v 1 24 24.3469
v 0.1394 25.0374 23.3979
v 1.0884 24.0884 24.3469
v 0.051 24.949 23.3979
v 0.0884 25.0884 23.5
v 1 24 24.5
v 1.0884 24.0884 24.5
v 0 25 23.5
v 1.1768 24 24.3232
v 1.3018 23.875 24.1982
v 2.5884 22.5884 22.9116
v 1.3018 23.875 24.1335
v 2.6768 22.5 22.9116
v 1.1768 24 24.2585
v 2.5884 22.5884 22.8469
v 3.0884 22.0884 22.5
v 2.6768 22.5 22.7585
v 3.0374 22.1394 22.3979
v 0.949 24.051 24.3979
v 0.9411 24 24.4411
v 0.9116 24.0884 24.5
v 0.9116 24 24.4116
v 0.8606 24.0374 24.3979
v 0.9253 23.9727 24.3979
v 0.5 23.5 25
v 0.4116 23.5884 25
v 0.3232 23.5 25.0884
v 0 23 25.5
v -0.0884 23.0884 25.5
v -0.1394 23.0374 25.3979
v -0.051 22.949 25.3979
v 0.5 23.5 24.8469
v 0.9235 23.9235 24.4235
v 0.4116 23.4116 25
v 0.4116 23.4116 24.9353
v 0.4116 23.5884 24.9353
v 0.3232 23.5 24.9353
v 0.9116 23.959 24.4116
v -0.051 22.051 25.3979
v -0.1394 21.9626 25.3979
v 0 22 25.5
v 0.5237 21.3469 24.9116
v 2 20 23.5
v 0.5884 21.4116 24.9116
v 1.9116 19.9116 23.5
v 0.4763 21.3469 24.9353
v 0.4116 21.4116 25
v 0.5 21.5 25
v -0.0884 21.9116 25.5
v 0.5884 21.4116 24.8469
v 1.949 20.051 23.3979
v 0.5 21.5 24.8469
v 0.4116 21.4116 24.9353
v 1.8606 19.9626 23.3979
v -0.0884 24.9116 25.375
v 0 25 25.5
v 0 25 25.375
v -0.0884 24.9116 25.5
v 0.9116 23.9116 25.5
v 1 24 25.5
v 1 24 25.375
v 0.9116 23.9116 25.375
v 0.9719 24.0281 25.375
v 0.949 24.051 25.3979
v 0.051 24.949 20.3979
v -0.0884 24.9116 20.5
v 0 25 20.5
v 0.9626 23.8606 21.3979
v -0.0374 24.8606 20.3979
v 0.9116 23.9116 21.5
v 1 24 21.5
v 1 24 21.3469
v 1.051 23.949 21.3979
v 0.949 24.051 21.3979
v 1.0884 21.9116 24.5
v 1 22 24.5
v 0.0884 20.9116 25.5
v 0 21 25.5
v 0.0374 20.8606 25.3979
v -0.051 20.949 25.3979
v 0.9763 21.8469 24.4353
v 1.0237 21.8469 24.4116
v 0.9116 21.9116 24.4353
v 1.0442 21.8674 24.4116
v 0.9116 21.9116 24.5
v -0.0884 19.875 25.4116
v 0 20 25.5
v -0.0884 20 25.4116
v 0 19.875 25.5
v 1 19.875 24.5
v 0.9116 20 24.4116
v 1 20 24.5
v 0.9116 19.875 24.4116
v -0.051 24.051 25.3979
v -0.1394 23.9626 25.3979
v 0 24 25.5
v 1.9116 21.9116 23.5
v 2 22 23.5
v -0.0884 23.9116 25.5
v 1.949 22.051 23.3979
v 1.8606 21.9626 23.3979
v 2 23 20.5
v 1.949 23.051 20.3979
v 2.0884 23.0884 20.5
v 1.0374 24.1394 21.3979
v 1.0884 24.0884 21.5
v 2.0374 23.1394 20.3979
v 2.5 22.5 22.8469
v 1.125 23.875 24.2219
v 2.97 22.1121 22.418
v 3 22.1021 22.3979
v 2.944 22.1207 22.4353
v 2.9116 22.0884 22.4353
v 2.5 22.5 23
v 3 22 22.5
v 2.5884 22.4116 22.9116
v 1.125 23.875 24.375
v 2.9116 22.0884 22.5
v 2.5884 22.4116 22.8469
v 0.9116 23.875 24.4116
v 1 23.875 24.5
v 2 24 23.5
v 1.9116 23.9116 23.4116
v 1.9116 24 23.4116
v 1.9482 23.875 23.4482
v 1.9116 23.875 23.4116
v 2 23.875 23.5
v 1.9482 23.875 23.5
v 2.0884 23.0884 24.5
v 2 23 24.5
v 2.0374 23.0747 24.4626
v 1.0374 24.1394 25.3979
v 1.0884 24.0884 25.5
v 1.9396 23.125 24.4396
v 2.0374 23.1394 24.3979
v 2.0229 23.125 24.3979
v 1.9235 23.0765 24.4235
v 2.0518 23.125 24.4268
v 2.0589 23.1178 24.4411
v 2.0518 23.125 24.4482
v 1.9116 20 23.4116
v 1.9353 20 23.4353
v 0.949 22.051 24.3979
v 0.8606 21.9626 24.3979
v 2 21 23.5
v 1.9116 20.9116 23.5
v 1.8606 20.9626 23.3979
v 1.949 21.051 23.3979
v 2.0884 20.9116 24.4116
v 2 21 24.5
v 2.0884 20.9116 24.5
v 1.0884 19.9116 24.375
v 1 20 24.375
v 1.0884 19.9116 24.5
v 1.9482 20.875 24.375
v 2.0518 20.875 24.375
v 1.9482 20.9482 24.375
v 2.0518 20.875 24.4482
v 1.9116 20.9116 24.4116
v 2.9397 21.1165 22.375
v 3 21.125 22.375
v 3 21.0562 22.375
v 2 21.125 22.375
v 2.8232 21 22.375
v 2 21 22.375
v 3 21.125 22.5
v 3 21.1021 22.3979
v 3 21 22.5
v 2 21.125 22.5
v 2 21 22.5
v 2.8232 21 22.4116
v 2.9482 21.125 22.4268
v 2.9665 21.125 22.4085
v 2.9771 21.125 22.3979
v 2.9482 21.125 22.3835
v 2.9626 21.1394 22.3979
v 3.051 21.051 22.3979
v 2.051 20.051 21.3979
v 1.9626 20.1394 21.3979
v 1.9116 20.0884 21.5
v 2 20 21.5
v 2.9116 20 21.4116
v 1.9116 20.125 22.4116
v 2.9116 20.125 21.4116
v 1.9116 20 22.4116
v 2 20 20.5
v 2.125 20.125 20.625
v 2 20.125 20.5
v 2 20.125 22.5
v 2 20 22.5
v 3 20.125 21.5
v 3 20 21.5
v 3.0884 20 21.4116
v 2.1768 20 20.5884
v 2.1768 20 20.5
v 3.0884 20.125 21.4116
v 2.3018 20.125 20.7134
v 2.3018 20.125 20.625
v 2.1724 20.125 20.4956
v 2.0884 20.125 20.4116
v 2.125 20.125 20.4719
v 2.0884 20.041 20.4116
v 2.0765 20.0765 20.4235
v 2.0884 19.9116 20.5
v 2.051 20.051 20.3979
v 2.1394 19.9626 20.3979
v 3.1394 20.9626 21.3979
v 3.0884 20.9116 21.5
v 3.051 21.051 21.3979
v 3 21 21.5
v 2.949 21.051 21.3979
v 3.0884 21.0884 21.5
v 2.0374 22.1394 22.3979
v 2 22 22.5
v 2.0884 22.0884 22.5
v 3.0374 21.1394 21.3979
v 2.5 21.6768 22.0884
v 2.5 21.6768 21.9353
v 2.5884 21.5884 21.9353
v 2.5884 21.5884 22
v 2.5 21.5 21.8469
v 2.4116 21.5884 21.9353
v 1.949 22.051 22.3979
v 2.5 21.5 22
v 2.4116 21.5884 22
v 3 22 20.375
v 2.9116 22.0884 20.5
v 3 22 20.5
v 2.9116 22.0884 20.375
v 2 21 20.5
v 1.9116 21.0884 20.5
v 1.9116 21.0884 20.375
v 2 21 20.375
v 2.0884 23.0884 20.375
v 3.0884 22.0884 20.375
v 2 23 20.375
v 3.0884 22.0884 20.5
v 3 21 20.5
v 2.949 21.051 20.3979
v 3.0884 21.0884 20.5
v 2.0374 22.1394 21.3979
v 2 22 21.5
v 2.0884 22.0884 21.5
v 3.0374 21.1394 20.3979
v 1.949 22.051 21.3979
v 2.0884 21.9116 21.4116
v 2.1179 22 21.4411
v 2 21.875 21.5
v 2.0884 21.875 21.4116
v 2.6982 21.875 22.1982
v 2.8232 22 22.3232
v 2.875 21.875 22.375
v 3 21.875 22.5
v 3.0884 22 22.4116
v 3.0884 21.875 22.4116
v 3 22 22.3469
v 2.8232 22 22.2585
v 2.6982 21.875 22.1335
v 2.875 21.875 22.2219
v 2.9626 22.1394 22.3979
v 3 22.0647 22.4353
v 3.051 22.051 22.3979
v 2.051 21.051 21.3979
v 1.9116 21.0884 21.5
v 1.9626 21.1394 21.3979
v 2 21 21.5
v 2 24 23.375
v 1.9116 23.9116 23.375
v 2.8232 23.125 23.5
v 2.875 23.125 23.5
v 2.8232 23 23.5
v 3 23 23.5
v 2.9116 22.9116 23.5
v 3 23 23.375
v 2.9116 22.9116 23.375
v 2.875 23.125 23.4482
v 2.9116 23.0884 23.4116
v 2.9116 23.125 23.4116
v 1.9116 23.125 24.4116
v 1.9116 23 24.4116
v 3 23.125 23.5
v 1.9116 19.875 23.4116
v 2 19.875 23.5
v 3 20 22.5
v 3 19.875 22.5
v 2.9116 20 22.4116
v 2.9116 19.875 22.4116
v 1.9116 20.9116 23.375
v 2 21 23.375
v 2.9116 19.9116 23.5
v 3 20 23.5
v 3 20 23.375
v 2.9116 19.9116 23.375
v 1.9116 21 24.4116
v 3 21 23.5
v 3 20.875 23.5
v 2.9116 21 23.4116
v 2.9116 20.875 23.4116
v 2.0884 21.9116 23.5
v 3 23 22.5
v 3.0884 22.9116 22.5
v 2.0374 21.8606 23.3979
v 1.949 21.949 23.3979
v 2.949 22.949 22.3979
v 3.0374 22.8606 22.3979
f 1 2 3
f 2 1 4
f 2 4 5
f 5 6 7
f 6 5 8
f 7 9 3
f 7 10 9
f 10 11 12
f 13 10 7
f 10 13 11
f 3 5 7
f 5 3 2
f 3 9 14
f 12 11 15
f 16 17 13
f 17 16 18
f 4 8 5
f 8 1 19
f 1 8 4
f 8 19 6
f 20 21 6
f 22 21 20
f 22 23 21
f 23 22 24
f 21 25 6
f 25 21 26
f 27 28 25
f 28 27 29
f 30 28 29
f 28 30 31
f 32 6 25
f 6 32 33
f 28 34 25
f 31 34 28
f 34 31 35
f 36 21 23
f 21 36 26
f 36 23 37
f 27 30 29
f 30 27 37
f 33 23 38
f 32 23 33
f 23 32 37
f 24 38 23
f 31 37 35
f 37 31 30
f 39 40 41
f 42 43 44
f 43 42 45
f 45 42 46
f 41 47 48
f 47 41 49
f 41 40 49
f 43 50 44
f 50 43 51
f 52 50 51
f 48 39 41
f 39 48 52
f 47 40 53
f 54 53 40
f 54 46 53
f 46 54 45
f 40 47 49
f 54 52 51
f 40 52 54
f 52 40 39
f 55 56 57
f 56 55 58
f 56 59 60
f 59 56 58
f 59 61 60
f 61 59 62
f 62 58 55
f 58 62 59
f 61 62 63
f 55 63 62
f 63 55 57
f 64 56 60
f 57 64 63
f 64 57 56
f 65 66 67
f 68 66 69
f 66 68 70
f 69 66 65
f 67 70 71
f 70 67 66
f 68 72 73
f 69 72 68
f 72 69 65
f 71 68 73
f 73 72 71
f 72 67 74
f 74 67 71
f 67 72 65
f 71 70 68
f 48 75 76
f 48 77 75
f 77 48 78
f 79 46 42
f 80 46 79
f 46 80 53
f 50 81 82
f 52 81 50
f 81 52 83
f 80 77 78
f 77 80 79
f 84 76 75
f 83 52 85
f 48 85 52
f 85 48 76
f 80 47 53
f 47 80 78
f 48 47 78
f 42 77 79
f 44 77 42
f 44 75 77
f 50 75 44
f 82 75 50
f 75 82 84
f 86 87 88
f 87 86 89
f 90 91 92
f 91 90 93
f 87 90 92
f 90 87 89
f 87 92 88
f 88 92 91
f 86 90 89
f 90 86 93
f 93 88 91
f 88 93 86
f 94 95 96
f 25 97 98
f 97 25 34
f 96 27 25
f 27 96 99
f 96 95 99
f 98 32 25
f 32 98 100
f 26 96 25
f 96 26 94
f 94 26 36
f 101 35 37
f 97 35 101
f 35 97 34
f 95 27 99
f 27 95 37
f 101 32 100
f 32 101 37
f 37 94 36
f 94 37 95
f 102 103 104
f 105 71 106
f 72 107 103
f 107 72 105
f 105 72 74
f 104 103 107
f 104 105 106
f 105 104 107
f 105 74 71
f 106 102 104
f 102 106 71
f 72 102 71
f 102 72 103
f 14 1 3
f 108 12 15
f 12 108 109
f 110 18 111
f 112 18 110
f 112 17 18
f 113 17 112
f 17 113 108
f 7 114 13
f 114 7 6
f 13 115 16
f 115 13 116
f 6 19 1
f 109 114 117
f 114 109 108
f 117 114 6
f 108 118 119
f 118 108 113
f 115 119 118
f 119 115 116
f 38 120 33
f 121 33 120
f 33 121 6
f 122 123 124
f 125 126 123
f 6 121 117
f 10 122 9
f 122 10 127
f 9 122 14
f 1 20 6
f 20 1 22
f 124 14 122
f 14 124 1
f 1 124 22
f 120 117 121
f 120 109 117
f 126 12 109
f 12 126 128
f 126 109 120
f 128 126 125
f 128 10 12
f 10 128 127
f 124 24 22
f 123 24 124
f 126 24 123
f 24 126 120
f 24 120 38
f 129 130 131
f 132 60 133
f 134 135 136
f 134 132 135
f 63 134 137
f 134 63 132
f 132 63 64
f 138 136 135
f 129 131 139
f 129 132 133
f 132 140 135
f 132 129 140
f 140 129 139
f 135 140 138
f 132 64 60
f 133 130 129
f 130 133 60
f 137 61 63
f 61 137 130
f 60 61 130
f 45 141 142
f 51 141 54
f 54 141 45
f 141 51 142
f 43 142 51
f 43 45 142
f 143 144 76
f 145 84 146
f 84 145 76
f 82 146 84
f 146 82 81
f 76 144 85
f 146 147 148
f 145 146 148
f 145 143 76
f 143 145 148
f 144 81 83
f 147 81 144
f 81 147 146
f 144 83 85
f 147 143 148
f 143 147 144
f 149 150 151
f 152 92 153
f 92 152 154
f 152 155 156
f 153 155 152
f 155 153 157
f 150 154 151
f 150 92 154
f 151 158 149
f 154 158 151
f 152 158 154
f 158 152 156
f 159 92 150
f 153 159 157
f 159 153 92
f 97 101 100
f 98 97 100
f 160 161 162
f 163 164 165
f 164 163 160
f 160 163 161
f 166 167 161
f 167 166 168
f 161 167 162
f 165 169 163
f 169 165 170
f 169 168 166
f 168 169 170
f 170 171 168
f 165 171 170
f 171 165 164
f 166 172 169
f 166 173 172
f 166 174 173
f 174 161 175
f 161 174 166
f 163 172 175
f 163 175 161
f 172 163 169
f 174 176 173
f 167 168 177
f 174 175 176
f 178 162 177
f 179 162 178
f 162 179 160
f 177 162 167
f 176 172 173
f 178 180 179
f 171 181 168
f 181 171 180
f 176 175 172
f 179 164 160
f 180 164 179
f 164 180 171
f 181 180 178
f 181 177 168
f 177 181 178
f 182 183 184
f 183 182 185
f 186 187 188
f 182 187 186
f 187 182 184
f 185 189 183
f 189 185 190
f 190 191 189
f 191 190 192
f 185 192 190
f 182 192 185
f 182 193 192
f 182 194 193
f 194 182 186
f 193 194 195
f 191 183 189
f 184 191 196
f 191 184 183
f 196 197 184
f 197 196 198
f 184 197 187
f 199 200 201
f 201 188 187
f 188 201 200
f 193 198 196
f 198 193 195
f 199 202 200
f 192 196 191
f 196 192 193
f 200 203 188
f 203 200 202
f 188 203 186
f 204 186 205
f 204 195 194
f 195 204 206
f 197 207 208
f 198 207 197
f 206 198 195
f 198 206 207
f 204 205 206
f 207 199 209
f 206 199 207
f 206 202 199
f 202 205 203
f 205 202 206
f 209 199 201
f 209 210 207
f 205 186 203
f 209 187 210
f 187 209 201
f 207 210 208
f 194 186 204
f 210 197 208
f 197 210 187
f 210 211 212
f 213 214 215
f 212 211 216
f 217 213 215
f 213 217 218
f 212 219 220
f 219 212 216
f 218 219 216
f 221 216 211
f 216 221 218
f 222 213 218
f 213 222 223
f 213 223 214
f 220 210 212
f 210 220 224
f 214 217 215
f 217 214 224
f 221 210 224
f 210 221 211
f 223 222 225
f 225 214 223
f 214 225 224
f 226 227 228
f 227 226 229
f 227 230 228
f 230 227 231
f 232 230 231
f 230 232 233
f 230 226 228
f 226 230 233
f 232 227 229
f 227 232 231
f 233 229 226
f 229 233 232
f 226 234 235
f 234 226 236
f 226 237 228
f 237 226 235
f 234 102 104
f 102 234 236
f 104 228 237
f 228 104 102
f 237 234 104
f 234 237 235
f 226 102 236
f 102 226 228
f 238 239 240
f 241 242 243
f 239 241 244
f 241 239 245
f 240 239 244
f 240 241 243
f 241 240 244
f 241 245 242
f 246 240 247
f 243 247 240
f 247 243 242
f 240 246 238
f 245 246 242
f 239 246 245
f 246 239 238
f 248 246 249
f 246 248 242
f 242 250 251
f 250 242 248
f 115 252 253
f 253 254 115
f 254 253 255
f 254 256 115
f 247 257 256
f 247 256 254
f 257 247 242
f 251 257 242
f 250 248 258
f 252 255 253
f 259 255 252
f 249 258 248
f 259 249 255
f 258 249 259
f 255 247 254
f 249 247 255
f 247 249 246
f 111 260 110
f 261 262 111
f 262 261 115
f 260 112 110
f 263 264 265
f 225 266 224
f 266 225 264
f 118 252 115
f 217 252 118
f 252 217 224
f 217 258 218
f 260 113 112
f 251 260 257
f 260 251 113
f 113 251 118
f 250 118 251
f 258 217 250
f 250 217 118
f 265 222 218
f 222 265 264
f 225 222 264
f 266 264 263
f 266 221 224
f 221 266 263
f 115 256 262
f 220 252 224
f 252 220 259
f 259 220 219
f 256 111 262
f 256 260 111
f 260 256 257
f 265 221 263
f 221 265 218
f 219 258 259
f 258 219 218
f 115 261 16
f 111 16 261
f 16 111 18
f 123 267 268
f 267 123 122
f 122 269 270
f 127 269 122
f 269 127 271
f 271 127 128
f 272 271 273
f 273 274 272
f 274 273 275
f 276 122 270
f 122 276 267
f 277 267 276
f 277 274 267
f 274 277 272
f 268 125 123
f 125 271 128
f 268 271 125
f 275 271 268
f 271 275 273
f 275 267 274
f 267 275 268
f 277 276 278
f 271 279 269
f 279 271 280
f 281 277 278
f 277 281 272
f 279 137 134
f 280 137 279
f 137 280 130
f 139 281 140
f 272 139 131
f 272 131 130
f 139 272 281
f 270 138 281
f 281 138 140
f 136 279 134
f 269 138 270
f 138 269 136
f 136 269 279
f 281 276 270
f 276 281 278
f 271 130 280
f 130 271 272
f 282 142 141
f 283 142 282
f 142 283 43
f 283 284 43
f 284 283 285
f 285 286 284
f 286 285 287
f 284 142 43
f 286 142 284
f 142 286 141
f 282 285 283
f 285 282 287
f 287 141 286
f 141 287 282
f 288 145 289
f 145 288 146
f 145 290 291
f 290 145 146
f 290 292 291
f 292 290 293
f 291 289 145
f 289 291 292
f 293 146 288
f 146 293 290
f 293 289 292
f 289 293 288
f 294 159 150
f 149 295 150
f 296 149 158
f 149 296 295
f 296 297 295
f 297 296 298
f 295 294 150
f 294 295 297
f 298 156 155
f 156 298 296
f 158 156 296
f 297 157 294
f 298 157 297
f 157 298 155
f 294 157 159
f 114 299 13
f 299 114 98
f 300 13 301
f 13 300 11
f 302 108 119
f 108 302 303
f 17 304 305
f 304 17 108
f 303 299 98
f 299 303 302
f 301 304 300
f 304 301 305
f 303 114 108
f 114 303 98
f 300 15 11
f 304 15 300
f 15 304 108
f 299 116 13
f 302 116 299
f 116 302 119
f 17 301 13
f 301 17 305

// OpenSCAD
translate(v = [-0.5, -0.5, 0]) {
	/*Shell 0*/
	union() {
		%/*Nodes shell 0*/
		union() {
			/*Node $_19*/
			color(alpha = 0.1, c = "yellow") {
				translate(v = [0, 25, 23]) {
					cube(size = [1, 1, 1]);
				}
			}
			/*Node $_40*/
			color(alpha = 0.1, c = "pink") {
				translate(v = [0, 23, 25]) {
					cube(size = [1, 1, 1]);
				}
			}
			/*Node $_37__0*/
			color(alpha = 0.1, c = "lightblue") {
				translate(v = [0, 22, 25]) {
					cube(size = [1, 1, 1]);
				}
			}
			/*Node $_42__0*/
			color(alpha = 0.1, c = "lightblue") {
				translate(v = [0, 25, 25]) {
					cube(size = [1, 1, 1]);
				}
			}
			/*Node $_38__0*/
			color(alpha = 0.1, c = "lightblue") {
				translate(v = [0, 25, 20]) {
					cube(size = [1, 1, 1]);
				}
			}
			/*Node $_36__0*/
			color(alpha = 0.1, c = "lightblue") {
				translate(v = [0, 21, 25]) {
					cube(size = [1, 1, 1]);
				}
			}
			/*Node $_41__0*/
			color(alpha = 0.1, c = "lightblue") {
				translate(v = [0, 20, 25]) {
					cube(size = [1, 1, 1]);
				}
			}
			/*Node $_39__0*/
			color(alpha = 0.1, c = "lightblue") {
				translate(v = [0, 24, 25]) {
					cube(size = [1, 1, 1]);
				}
			}
		}
		/*Edges shell 0*/
		union() {
			/*Edge 19 from thing.dead_bead to $_19*/
			translate(v = [0.5, 25.5, 23.5]) {
				rotate(a = [0, 54.735610317245346, -45.0]) {
					cube(size = [0.125, 0.125, 1.7320508075688772]);
				}
			}
			/*Edge 40 from thing.dead_bead to $_40*/
			translate(v = [0.5, 23.5, 25.5]) {
				rotate(a = [0, 125.26438968275465, 45.0]) {
					cube(size = [0.125, 0.125, 1.7320508075688772]);
				}
			}
			/*Edge -1 from $_37__0 to $_37__1*/
			translate(v = [1.5, 21.5, 24.5]) {
				rotate(a = [0, 54.735610317245346, 135.0]) {
					cube(size = [0.125, 0.125, 1.7320508075688772]);
				}
			}
			/*Edge -1 from $_42__0 to $_42__1*/
			translate(v = [1.5, 24.5, 25.5]) {
				rotate(a = [0, 90.0, 135.0]) {
					cube(size = [0.125, 0.125, 1.4142135623730951]);
				}
			}
			/*Edge -1 from $_38__0 to $_38__1*/
			translate(v = [1.5, 24.5, 21.5]) {
				rotate(a = [0, 125.26438968275465, 135.0]) {
					cube(size = [0.125, 0.125, 1.7320508075688772]);
				}
			}
			/*Edge -1 from $_36__0 to $_36__1*/
			translate(v = [1.5, 22.5, 24.5]) {
				rotate(a = [0, 54.735610317245346, -135.0]) {
					cube(size = [0.125, 0.125, 1.7320508075688772]);
				}
			}
			/*Edge -1 from $_41__0 to $_41__1*/
			translate(v = [1.5, 20.5, 24.5]) {
				rotate(a = [0, 45.00000000000001, 180.0]) {
					cube(size = [0.125, 0.125, 1.4142135623730951]);
				}
			}
			/*Edge -1 from $_39__0 to $_39__1*/
			translate(v = [1.5, 23.5, 24.5]) {
				rotate(a = [0, 54.735610317245346, 135.0]) {
					cube(size = [0.125, 0.125, 1.7320508075688772]);
				}
			}
		}
	}
	/*Shell 1*/
	union() {
		%/*Nodes shell 1*/
		union() {
			/*Node thing.dead_bead*/
			color(alpha = 0.1, c = "black") {
				translate(v = [1, 24, 24]) {
					cube(size = [1, 1, 1]);
				}
			}
			/*Node $_37__1*/
			color(alpha = 0.1, c = "lightblue") {
				translate(v = [1, 21, 24]) {
					cube(size = [1, 1, 1]);
				}
			}
			/*Node $_42__1*/
			color(alpha = 0.1, c = "lightblue") {
				translate(v = [1, 24, 25]) {
					cube(size = [1, 1, 1]);
				}
			}
			/*Node $_38__1*/
			color(alpha = 0.1, c = "lightblue") {
				translate(v = [1, 24, 21]) {
					cube(size = [1, 1, 1]);
				}
			}
			/*Node $_36__1*/
			color(alpha = 0.1, c = "lightblue") {
				translate(v = [1, 22, 24]) {
					cube(size = [1, 1, 1]);
				}
			}
			/*Node $_41__1*/
			color(alpha = 0.1, c = "lightblue") {
				translate(v = [1, 20, 24]) {
					cube(size = [1, 1, 1]);
				}
			}
			/*Node $_39__1*/
			color(alpha = 0.1, c = "lightblue") {
				translate(v = [1, 23, 24]) {
					cube(size = [1, 1, 1]);
				}
			}
		}
		/*Edges shell 1*/
		union() {
			/*Edge -1 from $_38 to $_38__1*/
			translate(v = [1.5, 24.5, 21.5]) {
				rotate(a = [0, 125.26438968275465, -45.0]) {
					cube(size = [0.125, 0.125, 1.7320508075688772]);
				}
			}
			/*Edge 111 from $_111 to thing.dead_bead*/
			translate(v = [1.5, 24.5, 24.5]) {
				rotate(a = [0, 125.26438968275465, -45.0]) {
					cube(size = [0.125, 0.125, 1.7320508075688772]);
				}
			}
			/*Edge 112 from thing.dead_bead to $_112*/
			translate(v = [2.5, 24.5, 23.5]) {
				rotate(a = [0, 45.00000000000001, 180.0]) {
					cube(size = [0.125, 0.125, 1.4142135623730951]);
				}
			}
			/*Edge -1 from $_42 to $_42__1*/
			translate(v = [1.5, 24.5, 25.5]) {
				rotate(a = [0, 125.26438968275465, -45.0]) {
					cube(size = [0.125, 0.125, 1.7320508075688772]);
				}
			}
			/*Edge -1 from $_37__1 to $_37__2*/
			translate(v = [2.5, 20.5, 23.5]) {
				rotate(a = [0, 54.735610317245346, 135.0]) {
					cube(size = [0.125, 0.125, 1.7320508075688772]);
				}
			}
			/*Edge -1 from $_36__1 to $_36__2*/
			translate(v = [2.5, 21.5, 23.5]) {
				rotate(a = [0, 54.735610317245346, 135.0]) {
					cube(size = [0.125, 0.125, 1.7320508075688772]);
				}
			}
			/*Edge -1 from $_41__1 to $_41__2*/
			translate(v = [2.5, 21.5, 24.5]) {
				rotate(a = [0, 90.0, -135.0]) {
					cube(size = [0.125, 0.125, 1.4142135623730951]);
				}
			}
			/*Edge -1 from $_39__1 to $_39__2*/
			translate(v = [2.5, 22.5, 23.5]) {
				rotate(a = [0, 54.735610317245346, 135.0]) {
					cube(size = [0.125, 0.125, 1.7320508075688772]);
				}
			}
		}
	}
	/*Shell 2*/
	union() {
		%/*Nodes shell 2*/
		union() {
			/*Node $_27*/
			color(alpha = 0.1, c = "yellow") {
				translate(v = [2, 21, 22]) {
					cube(size = [1, 1, 1]);
				}
			}
			/*Node $_97*/
			color(alpha = 0.1, c = "pink") {
				translate(v = [2, 20, 21]) {
					cube(size = [1, 1, 1]);
				}
			}
			/*Node $_28*/
			color(alpha = 0.1, c = "yellow") {
				translate(v = [2, 20, 22]) {
					cube(size = [1, 1, 1]);
				}
			}
			/*Node $_98*/
			color(alpha = 0.1, c = "pink") {
				translate(v = [2, 20, 20]) {
					cube(size = [1, 1, 1]);
				}
			}
			/*Node $_29*/
			color(alpha = 0.1, c = "yellow") {
				translate(v = [2, 22, 22]) {
					cube(size = [1, 1, 1]);
				}
			}
			/*Node $_26*/
			color(alpha = 0.1, c = "yellow") {
				translate(v = [2, 21, 20]) {
					cube(size = [1, 1, 1]);
				}
			}
			/*Node $_38*/
			color(alpha = 0.1, c = "pink") {
				translate(v = [2, 23, 20]) {
					cube(size = [1, 1, 1]);
				}
			}
			/*Node $_110*/
			color(alpha = 0.1, c = "orange") {
				translate(v = [2, 22, 21]) {
					cube(size = [1, 1, 1]);
				}
			}
			/*Node $_23*/
			color(alpha = 0.1, c = "orange") {
				translate(v = [2, 21, 21]) {
					cube(size = [1, 1, 1]);
				}
			}
			/*Node $_111*/
			color(alpha = 0.1, c = "pink") {
				translate(v = [2, 23, 23]) {
					cube(size = [1, 1, 1]);
				}
			}
			/*Node $_112*/
			color(alpha = 0.1, c = "orange") {
				translate(v = [2, 24, 23]) {
					cube(size = [1, 1, 1]);
				}
			}
			/*Node $_42*/
			color(alpha = 0.1, c = "pink") {
				translate(v = [2, 23, 24]) {
					cube(size = [1, 1, 1]);
				}
			}
			/*Node $_37__2*/
			color(alpha = 0.1, c = "lightblue") {
				translate(v = [2, 20, 23]) {
					cube(size = [1, 1, 1]);
				}
			}
			/*Node $_36__2*/
			color(alpha = 0.1, c = "lightblue") {
				translate(v = [2, 21, 23]) {
					cube(size = [1, 1, 1]);
				}
			}
			/*Node $_41__2*/
			color(alpha = 0.1, c = "lightblue") {
				translate(v = [2, 21, 24]) {
					cube(size = [1, 1, 1]);
				}
			}
			/*Node $_39__2*/
			color(alpha = 0.1, c = "lightblue") {
				translate(v = [2, 22, 23]) {
					cube(size = [1, 1, 1]);
				}
			}
		}
		/*Edges shell 2*/
		union() {
			/*Edge 27 from thing.chamber[2].thingy.p0 to $_27*/
			translate(v = [2.5, 21.5, 22.5]) {
				rotate(a = [0, 90.0, 0.0]) {
					cube(size = [0.125, 0.125, 1.0]);
				}
			}
			/*Edge 97 from thing.chamber[2].thingy.p0 to $_97*/
			translate(v = [2.5, 20.5, 21.5]) {
				rotate(a = [0, 54.735610317245346, 45.0]) {
					cube(size = [0.125, 0.125, 1.7320508075688772]);
				}
			}
			/*Edge 28 from thing.chamber[2].thingy.p1 to $_28*/
			translate(v = [2.5, 20.5, 22.5]) {
				rotate(a = [0, 135.0, 0.0]) {
					cube(size = [0.125, 0.125, 1.4142135623730951]);
				}
			}
			/*Edge 98 from thing.chamber[2].thingy.p1 to $_98*/
			translate(v = [2.5, 20.5, 20.5]) {
				rotate(a = [0, 45.00000000000001, 0.0]) {
					cube(size = [0.125, 0.125, 1.4142135623730951]);
				}
			}
			/*Edge 98 from $_98 to thing.chamber[2].thingy.p2*/
			translate(v = [3.5, 21.5, 21.5]) {
				rotate(a = [0, 125.26438968275465, -135.0]) {
					cube(size = [0.125, 0.125, 1.7320508075688772]);
				}
			}
			/*Edge 29 from thing.chamber[2].thingy.p2 to $_29*/
			translate(v = [2.5, 22.5, 22.5]) {
				rotate(a = [0, 125.26438968275465, -45.0]) {
					cube(size = [0.125, 0.125, 1.7320508075688772]);
				}
			}
			/*Edge 26 from thing.chamber[2].thingy.v13 to $_26*/
			translate(v = [2.5, 21.5, 20.5]) {
				rotate(a = [0, 90.0, 45.0]) {
					cube(size = [0.125, 0.125, 1.4142135623730951]);
				}
			}
			/*Edge 38 from thing.chamber[2].thingy.v13 to $_38*/
			translate(v = [2.5, 23.5, 20.5]) {
				rotate(a = [0, 90.0, -45.0]) {
					cube(size = [0.125, 0.125, 1.4142135623730951]);
				}
			}
			/*Edge 110 from thing.chamber[2].thingy.v8 to $_110*/
			translate(v = [2.5, 22.5, 21.5]) {
				rotate(a = [0, 125.26438968275465, -45.0]) {
					cube(size = [0.125, 0.125, 1.7320508075688772]);
				}
			}
			/*Edge 110 from $_110 to thing.chamber[2].thingy.v9*/
			translate(v = [3.5, 22.5, 22.5]) {
				rotate(a = [0, 135.0, 180.0]) {
					cube(size = [0.125, 0.125, 1.4142135623730951]);
				}
			}
			/*Edge 23 from thing.chamber[2].thingy.v9 to $_23*/
			translate(v = [2.5, 21.5, 21.5]) {
				rotate(a = [0, 54.735610317245346, 45.0]) {
					cube(size = [0.125, 0.125, 1.7320508075688772]);
				}
			}
			/*Edge 111 from thing.chamber[2].thingy.v9 to $_111*/
			translate(v = [2.5, 23.5, 23.5]) {
				rotate(a = [0, 125.26438968275465, -45.0]) {
					cube(size = [0.125, 0.125, 1.7320508075688772]);
				}
			}
			/*Edge 112 from $_112 to thing.dead_cell*/
			translate(v = [3.5, 23.5, 23.5]) {
				rotate(a = [0, 90.0, 135.0]) {
					cube(size = [0.125, 0.125, 1.4142135623730951]);
				}
			}
			/*Edge 42 from thing.dead_cell to $_42*/
			translate(v = [2.5, 23.5, 24.5]) {
				rotate(a = [0, 135.0, 0.0]) {
					cube(size = [0.125, 0.125, 1.4142135623730951]);
				}
			}
			/*Edge -1 from $_37__2 to $_37__3*/
			translate(v = [3.5, 20.5, 22.5]) {
				rotate(a = [0, 45.00000000000001, 180.0]) {
					cube(size = [0.125, 0.125, 1.4142135623730951]);
				}
			}
			/*Edge -1 from $_36__2 to $_36__3*/
			translate(v = [3.5, 20.5, 23.5]) {
				rotate(a = [0, 90.0, 135.0]) {
					cube(size = [0.125, 0.125, 1.4142135623730951]);
				}
			}
			/*Edge -1 from $_41__2 to $_41__3*/
			translate(v = [3.5, 21.5, 23.5]) {
				rotate(a = [0, 45.00000000000001, 180.0]) {
					cube(size = [0.125, 0.125, 1.4142135623730951]);
				}
			}
			/*Edge -1 from $_39__2 to $_39__3*/
			translate(v = [3.5, 23.5, 22.5]) {
				rotate(a = [0, 54.735610317245346, -135.0]) {
					cube(size = [0.125, 0.125, 1.7320508075688772]);
				}
			}
		}
	}
	/*Shell 3*/
	union() {
		%/*Nodes shell 3*/
		union() {
			/*Node thing.chamber[2].thingy.p0*/
			color(alpha = 0.1, c = "black") {
				translate(v = [3, 21, 22]) {
					cube(size = [1, 1, 1]);
				}
			}
			/*Node thing.chamber[2].thingy.p1*/
			color(alpha = 0.1, c = "black") {
				translate(v = [3, 20, 21]) {
					cube(size = [1, 1, 1]);
				}
			}
			/*Node thing.chamber[2].thingy.p2*/
			color(alpha = 0.1, c = "black") {
				translate(v = [3, 21, 21]) {
					cube(size = [1, 1, 1]);
				}
			}
			/*Node thing.chamber[2].thingy.v13*/
			color(alpha = 0.1, c = "black") {
				translate(v = [3, 22, 20]) {
					cube(size = [1, 1, 1]);
				}
			}
			/*Node thing.chamber[2].thingy.v8*/
			color(alpha = 0.1, c = "black") {
				translate(v = [3, 21, 20]) {
					cube(size = [1, 1, 1]);
				}
			}
			/*Node thing.chamber[2].thingy.v9*/
			color(alpha = 0.1, c = "black") {
				translate(v = [3, 22, 22]) {
					cube(size = [1, 1, 1]);
				}
			}
			/*Node thing.dead_cell*/
			color(alpha = 0.1, c = "black") {
				translate(v = [3, 23, 23]) {
					cube(size = [1, 1, 1]);
				}
			}
			/*Node $_37__3*/
			color(alpha = 0.1, c = "lightblue") {
				translate(v = [3, 20, 22]) {
					cube(size = [1, 1, 1]);
				}
			}
			/*Node $_36__3*/
			color(alpha = 0.1, c = "lightblue") {
				translate(v = [3, 20, 23]) {
					cube(size = [1, 1, 1]);
				}
			}
			/*Node $_41__3*/
			color(alpha = 0.1, c = "lightblue") {
				translate(v = [3, 21, 23]) {
					cube(size = [1, 1, 1]);
				}
			}
			/*Node $_39__3*/
			color(alpha = 0.1, c = "lightblue") {
				translate(v = [3, 23, 22]) {
					cube(size = [1, 1, 1]);
				}
			}
		}
		/*Edges shell 3*/
		union();
	}
	/*Shell 4*/
	union() {
		%/*Nodes shell 4*/
		union();
		/*Edges shell 4*/
		union();
	}
	/*Shell 5*/
	union() {
		%/*Nodes shell 5*/
		union();
		/*Edges shell 5*/
		union();
	}
	/*Shell 6*/
	union() {
		%/*Nodes shell 6*/
		union();
		/*Edges shell 6*/
		union();
	}
	/*Shell 7*/
	union() {
		%/*Nodes shell 7*/
		union();
		/*Edges shell 7*/
		union();
	}
	/*Shell 8*/
	union() {
		%/*Nodes shell 8*/
		union();
		/*Edges shell 8*/
		union();
	}
	/*Shell 9*/
	union() {
		%/*Nodes shell 9*/
		union();
		/*Edges shell 9*/
		union();
	}
	/*Shell 10*/
	union() {
		%/*Nodes shell 10*/
		union();
		/*Edges shell 10*/
		union();
	}
	/*Shell 11*/
	union() {
		%/*Nodes shell 11*/
		union();
		/*Edges shell 11*/
		union();
	}
	/*Shell 12*/
	union() {
		%/*Nodes shell 12*/
		union();
		/*Edges shell 12*/
		union();
	}
}
